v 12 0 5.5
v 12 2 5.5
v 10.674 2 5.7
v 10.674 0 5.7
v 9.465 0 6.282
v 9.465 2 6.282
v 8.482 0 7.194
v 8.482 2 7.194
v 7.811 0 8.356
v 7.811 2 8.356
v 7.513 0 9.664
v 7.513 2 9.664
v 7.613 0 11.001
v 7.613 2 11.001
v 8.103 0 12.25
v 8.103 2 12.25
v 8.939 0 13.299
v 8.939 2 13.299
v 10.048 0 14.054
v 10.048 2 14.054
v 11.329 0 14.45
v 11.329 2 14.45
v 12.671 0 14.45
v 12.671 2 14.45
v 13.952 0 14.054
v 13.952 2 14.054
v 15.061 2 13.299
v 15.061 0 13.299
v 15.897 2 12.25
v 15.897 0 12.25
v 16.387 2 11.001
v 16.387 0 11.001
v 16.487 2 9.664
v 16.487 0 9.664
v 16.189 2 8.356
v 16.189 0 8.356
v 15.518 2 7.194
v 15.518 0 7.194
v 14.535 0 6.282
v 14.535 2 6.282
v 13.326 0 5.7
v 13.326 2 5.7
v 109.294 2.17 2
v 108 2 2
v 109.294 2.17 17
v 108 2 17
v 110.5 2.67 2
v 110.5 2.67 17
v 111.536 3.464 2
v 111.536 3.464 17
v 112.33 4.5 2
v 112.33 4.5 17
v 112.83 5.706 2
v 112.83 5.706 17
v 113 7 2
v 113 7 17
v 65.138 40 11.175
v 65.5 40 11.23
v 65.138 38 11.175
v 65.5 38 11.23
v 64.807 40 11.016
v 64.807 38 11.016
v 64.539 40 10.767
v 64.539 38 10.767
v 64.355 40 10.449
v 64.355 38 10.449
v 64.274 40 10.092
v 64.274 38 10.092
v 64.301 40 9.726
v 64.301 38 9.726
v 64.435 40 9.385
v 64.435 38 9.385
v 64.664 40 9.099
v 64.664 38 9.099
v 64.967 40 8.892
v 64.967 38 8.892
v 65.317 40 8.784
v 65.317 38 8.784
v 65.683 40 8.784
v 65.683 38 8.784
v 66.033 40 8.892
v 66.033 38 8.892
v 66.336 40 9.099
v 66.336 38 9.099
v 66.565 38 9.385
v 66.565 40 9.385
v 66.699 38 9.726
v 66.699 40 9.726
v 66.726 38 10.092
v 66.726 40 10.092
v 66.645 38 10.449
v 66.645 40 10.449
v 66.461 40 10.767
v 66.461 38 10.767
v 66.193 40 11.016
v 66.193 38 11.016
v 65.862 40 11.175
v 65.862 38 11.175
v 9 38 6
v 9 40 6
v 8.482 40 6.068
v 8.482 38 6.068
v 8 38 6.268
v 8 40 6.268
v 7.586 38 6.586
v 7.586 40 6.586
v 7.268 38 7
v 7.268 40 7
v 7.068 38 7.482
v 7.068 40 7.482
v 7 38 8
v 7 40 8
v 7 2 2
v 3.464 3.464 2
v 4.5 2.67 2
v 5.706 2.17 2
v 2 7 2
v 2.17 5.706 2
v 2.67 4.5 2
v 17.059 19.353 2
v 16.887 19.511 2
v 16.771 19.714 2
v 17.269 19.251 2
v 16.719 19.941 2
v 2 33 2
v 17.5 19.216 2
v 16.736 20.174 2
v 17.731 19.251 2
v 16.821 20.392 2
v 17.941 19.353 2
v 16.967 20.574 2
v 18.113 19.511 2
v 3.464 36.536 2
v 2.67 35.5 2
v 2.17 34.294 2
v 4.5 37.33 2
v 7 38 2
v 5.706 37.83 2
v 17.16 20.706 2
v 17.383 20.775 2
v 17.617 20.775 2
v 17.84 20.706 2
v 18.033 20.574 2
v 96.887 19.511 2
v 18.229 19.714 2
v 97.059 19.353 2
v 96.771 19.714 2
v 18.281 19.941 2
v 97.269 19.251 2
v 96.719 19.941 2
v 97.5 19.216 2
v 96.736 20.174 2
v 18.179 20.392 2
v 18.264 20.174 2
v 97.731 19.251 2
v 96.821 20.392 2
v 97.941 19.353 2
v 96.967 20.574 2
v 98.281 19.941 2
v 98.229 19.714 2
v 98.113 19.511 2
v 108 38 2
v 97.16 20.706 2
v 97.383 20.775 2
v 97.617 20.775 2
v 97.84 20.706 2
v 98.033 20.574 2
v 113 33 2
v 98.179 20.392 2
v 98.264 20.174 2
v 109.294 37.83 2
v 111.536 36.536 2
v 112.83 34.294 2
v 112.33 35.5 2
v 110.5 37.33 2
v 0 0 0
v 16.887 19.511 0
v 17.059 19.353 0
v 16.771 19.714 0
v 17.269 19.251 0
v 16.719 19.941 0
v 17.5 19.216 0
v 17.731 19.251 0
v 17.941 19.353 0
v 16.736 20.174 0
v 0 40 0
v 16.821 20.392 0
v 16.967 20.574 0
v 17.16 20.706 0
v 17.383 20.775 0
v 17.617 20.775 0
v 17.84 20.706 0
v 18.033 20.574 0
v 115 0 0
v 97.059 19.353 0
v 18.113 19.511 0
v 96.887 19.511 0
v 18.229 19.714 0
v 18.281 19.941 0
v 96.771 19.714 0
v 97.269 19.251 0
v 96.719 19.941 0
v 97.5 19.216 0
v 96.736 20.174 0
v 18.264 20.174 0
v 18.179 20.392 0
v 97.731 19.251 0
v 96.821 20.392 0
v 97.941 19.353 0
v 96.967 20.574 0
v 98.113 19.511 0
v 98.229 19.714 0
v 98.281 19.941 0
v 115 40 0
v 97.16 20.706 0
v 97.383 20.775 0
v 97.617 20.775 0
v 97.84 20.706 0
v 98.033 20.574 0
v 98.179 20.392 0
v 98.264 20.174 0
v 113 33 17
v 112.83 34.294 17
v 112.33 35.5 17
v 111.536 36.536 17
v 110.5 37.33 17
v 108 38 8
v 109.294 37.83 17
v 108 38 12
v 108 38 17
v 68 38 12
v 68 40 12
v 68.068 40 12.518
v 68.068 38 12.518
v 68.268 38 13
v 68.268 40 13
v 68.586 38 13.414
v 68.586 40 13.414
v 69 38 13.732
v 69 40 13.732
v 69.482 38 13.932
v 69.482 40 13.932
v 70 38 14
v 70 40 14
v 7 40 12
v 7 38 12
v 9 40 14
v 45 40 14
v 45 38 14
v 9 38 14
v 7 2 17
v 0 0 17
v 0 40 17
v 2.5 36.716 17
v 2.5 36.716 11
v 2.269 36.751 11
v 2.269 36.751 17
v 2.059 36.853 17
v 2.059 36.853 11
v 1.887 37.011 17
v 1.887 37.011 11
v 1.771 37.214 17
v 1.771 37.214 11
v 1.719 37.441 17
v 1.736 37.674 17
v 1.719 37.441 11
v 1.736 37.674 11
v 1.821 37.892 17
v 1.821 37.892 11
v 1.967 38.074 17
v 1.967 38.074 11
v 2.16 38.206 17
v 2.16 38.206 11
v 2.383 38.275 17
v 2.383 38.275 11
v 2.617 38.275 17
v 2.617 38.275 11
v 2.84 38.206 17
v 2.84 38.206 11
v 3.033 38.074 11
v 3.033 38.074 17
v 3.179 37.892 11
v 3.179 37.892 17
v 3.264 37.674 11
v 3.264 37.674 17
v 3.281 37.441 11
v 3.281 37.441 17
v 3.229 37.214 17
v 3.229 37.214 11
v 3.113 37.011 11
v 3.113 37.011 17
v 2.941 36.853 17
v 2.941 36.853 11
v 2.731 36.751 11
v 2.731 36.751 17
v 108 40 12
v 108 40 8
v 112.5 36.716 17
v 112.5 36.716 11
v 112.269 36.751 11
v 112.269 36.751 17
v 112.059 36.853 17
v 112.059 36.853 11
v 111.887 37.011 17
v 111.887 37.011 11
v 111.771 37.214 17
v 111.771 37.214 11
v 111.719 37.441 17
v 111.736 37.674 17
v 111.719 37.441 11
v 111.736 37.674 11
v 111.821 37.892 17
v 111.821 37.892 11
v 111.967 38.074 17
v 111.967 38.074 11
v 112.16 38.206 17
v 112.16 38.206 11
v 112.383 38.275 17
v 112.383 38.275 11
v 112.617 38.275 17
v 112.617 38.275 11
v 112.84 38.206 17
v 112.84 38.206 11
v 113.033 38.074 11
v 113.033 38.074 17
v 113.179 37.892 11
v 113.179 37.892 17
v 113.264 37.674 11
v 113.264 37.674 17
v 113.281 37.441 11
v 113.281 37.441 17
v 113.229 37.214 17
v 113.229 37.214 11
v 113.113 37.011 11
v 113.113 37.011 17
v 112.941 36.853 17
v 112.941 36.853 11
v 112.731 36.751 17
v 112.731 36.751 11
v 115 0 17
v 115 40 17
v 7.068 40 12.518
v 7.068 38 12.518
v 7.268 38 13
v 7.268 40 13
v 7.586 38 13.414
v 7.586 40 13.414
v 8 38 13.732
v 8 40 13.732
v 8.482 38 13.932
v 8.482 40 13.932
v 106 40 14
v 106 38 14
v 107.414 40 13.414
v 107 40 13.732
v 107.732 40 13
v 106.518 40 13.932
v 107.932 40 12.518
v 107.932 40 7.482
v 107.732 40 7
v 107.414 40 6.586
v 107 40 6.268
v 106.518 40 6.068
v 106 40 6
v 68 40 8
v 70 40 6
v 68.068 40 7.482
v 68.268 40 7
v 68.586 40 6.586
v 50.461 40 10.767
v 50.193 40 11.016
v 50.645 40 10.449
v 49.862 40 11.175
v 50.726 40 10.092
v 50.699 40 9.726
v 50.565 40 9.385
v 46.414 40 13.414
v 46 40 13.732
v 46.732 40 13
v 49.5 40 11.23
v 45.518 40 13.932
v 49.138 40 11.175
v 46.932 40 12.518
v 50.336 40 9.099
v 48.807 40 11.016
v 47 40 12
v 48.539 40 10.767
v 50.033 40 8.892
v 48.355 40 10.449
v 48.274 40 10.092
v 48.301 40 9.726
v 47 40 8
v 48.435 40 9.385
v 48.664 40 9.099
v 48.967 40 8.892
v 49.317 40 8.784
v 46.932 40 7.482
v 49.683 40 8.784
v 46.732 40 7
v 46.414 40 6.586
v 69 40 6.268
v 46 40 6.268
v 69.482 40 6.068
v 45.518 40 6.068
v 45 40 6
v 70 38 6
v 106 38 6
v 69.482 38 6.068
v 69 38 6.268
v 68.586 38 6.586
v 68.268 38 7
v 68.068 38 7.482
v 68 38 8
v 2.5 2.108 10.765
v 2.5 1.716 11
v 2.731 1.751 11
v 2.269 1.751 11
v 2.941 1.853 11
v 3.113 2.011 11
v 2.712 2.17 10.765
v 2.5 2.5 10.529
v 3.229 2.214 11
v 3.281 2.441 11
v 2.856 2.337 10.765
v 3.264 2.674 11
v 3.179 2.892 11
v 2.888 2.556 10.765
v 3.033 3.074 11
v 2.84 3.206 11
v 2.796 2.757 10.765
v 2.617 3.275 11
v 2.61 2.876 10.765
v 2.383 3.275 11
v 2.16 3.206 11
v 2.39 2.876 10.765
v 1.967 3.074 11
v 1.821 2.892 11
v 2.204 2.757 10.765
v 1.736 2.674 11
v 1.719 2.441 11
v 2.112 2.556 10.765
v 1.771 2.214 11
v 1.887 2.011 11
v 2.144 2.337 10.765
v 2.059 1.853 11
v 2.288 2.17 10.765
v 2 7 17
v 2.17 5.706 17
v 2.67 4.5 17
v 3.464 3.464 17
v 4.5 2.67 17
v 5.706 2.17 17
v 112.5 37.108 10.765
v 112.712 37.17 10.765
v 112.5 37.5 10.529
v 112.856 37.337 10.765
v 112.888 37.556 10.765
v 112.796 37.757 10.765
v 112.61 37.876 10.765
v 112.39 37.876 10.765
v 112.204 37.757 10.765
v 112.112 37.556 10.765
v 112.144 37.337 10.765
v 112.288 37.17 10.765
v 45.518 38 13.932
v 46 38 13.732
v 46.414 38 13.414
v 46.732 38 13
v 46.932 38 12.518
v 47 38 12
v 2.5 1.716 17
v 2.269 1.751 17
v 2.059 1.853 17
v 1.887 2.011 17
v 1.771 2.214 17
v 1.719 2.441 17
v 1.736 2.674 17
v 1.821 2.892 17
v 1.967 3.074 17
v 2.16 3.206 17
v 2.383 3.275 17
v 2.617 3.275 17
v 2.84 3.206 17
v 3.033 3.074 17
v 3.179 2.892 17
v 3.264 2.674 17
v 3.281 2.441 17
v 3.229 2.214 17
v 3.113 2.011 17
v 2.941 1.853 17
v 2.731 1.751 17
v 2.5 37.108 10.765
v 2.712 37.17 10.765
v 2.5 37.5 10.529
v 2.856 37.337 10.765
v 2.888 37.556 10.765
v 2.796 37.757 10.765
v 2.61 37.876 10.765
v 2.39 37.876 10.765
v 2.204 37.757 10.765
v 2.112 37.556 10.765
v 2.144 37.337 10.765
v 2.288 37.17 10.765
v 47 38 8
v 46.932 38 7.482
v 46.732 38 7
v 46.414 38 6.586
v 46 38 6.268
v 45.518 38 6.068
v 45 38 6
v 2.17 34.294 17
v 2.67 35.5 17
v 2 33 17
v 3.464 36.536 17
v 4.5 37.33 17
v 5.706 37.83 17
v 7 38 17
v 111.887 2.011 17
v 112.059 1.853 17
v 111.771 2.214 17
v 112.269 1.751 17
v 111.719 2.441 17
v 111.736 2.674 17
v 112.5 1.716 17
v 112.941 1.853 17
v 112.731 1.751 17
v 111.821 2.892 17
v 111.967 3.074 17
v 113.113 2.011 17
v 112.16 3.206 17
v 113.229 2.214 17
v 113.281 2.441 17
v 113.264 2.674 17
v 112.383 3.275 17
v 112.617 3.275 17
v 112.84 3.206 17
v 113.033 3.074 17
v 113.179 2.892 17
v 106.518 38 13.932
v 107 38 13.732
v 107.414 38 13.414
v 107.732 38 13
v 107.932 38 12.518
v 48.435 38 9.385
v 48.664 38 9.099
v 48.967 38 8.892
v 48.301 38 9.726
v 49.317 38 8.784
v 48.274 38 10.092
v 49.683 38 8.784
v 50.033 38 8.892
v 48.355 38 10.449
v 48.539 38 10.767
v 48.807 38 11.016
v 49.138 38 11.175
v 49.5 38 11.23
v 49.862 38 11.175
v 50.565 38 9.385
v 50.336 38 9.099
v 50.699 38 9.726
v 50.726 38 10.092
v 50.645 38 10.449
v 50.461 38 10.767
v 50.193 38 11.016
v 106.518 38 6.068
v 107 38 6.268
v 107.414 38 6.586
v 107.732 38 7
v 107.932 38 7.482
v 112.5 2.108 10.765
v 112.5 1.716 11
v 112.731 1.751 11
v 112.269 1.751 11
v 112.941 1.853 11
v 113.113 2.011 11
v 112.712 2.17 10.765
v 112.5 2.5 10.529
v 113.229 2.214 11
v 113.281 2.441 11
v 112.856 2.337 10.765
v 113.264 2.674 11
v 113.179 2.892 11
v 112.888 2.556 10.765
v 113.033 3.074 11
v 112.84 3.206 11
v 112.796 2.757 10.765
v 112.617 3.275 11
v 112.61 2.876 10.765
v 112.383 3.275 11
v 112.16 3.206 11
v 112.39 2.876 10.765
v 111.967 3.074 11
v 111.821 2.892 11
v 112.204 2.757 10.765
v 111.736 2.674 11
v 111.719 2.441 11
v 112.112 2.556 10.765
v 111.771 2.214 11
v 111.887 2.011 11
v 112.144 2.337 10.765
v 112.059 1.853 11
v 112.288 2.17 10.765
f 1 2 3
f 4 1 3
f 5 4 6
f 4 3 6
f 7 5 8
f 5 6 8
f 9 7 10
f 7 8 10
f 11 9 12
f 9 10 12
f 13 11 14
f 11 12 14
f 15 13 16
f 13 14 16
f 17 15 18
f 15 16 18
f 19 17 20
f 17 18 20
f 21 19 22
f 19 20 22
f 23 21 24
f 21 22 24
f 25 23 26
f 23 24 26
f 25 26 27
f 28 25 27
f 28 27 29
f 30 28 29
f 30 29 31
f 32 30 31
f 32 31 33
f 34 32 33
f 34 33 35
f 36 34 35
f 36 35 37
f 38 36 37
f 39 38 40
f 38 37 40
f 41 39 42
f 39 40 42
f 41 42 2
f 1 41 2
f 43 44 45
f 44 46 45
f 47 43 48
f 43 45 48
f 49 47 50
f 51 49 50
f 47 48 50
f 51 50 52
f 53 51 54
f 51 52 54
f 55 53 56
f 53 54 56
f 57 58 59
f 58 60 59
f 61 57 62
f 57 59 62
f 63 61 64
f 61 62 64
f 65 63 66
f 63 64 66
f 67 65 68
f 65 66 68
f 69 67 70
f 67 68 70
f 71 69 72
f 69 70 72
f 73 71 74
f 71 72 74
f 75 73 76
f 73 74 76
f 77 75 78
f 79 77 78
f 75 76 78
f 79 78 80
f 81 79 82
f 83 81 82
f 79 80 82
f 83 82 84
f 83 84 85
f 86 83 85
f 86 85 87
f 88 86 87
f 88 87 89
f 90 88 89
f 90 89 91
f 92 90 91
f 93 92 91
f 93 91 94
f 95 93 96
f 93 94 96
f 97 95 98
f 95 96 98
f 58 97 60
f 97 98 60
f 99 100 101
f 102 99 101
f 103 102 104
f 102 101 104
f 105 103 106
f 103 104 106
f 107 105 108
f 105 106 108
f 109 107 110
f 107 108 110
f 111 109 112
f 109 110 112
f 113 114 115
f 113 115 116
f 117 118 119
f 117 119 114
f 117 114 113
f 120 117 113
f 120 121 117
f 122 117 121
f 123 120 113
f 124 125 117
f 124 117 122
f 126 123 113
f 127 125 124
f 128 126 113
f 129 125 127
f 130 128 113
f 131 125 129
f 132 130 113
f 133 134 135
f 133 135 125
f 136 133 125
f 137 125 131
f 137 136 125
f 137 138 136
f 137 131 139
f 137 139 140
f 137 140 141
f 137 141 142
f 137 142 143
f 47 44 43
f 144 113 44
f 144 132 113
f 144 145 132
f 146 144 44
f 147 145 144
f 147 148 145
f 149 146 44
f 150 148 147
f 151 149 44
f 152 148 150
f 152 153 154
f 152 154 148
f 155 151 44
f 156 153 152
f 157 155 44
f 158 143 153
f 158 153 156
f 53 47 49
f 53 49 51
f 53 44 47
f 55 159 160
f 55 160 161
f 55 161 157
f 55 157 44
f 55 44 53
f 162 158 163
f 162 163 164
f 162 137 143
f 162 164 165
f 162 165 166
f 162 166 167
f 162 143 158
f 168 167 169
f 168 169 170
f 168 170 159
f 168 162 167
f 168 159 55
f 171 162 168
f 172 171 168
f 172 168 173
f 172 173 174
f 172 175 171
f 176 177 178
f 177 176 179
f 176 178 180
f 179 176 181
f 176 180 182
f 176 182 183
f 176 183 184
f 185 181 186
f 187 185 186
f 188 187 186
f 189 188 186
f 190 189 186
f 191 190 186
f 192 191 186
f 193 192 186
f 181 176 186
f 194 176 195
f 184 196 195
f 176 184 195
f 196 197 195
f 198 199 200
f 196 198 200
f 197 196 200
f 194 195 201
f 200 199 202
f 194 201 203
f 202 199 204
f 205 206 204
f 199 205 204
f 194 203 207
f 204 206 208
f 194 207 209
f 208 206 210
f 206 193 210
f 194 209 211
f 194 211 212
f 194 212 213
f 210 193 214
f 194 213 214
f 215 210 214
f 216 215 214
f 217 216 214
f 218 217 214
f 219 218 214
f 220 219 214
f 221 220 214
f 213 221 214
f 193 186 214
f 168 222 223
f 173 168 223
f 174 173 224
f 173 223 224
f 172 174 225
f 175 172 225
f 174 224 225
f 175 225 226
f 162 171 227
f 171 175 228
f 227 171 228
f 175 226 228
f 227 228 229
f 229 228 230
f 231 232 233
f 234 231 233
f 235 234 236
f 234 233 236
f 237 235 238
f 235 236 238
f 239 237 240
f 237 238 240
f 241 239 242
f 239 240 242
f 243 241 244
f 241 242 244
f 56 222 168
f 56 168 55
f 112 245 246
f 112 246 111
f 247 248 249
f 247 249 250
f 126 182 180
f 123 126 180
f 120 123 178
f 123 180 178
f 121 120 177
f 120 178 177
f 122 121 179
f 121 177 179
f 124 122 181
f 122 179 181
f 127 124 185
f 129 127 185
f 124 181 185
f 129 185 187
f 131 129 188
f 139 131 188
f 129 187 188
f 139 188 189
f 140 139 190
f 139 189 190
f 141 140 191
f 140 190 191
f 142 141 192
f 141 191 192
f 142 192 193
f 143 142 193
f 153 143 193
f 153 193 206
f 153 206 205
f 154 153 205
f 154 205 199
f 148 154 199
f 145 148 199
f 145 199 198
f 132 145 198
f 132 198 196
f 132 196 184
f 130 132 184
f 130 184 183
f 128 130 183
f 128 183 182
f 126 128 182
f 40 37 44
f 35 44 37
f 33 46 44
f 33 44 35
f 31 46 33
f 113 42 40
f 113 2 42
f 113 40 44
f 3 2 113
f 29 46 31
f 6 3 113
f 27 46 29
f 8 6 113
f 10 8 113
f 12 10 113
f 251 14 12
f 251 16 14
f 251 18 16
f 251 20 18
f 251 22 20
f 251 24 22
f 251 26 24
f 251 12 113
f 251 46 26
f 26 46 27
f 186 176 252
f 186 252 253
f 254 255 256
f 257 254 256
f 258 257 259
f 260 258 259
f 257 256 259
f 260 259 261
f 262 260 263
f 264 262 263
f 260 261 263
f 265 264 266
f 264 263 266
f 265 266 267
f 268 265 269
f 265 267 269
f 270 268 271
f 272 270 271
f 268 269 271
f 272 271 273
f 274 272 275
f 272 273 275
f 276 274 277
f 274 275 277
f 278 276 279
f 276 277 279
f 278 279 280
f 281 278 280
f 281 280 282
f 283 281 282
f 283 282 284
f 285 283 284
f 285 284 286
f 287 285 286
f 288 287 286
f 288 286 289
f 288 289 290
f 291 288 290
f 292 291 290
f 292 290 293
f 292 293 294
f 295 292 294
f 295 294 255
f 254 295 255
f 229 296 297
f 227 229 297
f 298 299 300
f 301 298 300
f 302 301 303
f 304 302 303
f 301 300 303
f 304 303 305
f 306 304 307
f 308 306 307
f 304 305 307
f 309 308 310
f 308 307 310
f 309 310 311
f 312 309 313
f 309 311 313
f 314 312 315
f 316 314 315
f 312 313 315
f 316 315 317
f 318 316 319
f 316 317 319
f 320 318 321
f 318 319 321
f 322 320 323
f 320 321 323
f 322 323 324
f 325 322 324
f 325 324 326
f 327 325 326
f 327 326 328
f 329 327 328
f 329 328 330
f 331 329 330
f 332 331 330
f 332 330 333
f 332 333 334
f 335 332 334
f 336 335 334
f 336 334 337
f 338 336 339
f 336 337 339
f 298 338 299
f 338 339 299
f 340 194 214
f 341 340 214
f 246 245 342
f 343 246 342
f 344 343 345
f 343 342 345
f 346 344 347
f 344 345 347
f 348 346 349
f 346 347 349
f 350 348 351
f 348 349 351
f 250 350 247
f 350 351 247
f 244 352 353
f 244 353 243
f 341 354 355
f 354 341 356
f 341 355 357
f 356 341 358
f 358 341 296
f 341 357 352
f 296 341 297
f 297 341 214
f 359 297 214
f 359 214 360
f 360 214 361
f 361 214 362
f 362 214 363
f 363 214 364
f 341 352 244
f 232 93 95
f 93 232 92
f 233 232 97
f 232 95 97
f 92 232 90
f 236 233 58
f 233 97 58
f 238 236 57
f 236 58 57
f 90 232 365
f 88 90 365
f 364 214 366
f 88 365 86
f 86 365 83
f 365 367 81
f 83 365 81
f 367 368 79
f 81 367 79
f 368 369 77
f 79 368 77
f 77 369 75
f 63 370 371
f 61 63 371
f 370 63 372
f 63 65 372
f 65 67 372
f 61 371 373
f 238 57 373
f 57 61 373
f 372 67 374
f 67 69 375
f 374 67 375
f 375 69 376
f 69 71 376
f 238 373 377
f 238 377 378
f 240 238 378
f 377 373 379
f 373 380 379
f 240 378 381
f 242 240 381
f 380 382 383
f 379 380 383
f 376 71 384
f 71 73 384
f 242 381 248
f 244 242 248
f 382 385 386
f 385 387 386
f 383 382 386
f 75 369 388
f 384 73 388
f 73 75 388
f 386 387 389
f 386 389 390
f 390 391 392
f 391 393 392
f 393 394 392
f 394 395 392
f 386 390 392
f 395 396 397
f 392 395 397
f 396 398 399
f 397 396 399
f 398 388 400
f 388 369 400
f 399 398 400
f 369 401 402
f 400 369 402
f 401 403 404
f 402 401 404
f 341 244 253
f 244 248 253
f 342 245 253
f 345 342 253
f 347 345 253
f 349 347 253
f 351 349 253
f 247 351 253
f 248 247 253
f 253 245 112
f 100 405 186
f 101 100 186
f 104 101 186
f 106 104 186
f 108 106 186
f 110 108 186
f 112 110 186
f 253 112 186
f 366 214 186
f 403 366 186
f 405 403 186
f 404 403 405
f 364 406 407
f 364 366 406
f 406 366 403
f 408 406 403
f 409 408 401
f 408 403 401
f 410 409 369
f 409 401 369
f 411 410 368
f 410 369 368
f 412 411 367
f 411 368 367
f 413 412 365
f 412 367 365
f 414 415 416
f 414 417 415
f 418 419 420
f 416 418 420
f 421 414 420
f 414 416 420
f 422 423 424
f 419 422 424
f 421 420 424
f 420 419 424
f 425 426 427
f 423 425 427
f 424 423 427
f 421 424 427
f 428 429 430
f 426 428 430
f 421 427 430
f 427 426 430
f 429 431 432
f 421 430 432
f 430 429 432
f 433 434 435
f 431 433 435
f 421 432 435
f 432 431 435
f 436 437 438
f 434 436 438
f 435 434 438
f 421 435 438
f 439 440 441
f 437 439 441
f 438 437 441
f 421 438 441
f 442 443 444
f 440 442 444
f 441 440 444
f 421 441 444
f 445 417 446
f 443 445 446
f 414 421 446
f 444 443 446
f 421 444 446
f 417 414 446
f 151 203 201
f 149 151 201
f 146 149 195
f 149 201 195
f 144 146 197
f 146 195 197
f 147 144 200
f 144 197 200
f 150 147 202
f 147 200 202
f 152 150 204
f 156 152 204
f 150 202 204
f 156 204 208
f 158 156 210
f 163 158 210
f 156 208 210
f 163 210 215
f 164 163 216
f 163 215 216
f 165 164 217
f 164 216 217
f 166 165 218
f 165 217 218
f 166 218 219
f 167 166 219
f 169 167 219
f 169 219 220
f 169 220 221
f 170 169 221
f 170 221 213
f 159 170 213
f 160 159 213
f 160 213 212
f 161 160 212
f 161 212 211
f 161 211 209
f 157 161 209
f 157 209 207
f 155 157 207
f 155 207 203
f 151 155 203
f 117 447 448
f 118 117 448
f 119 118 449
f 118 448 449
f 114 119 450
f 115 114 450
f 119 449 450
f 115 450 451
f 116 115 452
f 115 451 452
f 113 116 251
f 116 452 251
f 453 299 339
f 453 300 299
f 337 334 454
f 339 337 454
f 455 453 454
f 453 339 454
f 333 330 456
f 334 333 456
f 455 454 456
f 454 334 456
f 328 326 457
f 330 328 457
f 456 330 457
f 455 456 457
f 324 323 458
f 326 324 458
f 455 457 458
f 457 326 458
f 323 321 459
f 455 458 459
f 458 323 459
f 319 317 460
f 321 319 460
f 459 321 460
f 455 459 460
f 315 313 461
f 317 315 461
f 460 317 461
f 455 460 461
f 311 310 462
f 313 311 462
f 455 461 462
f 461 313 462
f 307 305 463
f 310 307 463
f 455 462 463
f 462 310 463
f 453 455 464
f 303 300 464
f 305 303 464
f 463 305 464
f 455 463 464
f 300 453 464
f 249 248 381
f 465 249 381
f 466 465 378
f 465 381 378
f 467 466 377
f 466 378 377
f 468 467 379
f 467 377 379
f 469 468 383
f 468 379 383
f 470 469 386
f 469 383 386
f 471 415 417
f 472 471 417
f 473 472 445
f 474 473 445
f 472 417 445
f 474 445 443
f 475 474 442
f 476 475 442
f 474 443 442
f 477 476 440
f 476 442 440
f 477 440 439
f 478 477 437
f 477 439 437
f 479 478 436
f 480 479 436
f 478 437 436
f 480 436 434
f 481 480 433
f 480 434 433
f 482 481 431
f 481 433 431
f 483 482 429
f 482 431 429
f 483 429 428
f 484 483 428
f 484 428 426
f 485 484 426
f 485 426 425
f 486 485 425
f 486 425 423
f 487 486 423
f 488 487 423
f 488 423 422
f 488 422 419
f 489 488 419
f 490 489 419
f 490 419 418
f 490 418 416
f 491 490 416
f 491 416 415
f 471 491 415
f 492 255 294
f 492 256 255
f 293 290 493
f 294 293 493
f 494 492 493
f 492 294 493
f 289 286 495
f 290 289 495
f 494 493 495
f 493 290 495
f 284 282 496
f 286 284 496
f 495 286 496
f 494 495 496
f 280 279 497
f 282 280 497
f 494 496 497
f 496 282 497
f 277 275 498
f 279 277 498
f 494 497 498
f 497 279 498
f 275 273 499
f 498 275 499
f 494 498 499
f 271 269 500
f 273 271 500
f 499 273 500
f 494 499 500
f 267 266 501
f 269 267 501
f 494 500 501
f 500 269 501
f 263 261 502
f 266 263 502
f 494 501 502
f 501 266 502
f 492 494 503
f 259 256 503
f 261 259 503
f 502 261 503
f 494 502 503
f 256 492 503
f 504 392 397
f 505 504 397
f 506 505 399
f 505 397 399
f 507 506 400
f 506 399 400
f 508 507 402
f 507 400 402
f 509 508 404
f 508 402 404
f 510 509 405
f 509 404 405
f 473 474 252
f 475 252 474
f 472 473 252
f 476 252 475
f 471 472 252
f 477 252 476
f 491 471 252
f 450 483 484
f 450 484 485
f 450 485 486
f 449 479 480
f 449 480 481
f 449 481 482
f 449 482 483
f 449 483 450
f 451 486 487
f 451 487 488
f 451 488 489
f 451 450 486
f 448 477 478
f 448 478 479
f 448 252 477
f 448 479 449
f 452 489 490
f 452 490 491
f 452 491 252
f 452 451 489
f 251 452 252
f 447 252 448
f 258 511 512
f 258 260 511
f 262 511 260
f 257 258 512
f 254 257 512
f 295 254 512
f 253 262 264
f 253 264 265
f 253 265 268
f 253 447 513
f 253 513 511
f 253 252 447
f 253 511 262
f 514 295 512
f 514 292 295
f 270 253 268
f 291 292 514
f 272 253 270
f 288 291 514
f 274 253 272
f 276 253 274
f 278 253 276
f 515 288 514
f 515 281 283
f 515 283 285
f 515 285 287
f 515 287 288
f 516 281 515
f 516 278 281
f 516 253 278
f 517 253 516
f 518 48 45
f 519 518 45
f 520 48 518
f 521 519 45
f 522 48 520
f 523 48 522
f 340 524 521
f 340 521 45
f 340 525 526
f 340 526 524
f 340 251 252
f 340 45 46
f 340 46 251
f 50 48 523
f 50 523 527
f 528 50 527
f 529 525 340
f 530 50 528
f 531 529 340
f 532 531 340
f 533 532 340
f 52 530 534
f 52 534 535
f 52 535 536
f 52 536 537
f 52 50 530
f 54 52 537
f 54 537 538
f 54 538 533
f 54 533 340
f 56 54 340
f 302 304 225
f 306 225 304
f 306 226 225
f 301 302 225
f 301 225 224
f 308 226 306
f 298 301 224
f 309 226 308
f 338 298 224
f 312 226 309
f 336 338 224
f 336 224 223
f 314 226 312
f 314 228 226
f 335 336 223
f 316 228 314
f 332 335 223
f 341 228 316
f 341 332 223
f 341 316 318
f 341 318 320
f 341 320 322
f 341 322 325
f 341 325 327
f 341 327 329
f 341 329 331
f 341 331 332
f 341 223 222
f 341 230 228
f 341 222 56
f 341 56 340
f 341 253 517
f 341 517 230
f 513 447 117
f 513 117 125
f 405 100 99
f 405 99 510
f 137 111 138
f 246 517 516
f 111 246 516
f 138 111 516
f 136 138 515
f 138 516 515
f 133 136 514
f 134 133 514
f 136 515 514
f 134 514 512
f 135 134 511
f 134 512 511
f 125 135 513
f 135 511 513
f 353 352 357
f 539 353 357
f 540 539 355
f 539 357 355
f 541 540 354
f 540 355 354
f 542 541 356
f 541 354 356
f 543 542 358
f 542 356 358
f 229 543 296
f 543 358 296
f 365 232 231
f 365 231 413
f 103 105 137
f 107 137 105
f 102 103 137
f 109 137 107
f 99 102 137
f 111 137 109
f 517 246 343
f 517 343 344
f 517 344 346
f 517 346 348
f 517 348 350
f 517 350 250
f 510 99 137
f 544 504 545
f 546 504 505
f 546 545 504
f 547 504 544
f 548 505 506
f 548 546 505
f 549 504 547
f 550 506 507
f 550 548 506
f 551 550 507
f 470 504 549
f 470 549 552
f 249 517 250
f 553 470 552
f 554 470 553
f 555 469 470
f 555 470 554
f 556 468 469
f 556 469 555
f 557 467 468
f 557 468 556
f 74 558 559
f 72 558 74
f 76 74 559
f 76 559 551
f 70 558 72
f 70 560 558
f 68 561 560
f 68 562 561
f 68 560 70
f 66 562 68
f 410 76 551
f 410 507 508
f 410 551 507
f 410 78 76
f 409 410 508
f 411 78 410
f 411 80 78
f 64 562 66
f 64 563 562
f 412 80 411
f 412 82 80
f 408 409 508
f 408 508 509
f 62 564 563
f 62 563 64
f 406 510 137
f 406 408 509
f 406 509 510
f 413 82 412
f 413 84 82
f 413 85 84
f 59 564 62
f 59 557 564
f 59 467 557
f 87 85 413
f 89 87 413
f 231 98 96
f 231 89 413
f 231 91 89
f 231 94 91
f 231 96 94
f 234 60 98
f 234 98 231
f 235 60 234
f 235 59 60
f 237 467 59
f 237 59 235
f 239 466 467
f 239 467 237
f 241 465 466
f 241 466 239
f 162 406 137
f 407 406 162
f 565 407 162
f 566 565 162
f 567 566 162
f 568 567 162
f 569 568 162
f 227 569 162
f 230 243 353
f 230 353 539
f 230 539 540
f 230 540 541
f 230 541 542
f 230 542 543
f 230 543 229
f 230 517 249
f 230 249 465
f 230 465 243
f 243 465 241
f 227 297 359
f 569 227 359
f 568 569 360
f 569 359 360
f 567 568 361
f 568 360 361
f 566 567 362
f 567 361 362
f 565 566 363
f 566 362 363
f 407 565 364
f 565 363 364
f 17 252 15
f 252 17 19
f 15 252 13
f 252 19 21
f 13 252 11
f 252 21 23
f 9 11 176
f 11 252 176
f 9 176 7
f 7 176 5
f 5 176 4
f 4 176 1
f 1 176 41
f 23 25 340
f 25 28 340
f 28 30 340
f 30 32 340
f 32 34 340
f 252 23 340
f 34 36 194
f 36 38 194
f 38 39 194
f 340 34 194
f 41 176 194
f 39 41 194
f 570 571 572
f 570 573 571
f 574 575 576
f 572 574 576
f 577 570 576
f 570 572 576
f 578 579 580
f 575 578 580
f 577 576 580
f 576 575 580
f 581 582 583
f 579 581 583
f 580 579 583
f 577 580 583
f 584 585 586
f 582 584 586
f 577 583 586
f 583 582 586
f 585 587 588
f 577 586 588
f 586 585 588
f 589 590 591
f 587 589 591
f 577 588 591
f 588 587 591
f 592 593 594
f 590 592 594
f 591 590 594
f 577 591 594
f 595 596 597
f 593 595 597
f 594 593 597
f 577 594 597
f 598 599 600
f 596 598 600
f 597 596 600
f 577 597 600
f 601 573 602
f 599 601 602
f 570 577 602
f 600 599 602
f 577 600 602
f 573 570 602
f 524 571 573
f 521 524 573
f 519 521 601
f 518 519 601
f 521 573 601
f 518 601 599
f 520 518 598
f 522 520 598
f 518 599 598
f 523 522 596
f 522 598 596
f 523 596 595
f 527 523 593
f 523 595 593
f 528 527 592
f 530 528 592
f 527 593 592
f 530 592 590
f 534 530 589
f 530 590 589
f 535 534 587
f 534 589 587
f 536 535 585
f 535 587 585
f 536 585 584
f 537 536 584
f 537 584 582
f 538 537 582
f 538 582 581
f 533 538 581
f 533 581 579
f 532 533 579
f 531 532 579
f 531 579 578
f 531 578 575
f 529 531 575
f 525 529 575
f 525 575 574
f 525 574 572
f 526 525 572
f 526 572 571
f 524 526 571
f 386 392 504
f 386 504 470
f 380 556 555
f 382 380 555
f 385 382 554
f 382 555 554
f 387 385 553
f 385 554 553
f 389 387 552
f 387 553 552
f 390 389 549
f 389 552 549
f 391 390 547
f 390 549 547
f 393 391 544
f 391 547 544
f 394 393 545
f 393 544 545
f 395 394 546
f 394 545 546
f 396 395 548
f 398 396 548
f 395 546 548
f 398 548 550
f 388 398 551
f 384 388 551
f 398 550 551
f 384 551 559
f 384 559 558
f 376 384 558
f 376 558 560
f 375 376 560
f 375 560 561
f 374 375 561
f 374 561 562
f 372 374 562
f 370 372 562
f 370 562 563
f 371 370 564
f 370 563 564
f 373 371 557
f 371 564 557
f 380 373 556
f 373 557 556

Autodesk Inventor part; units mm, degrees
ref_plane "YZ Plane" through (0, 0, 0) normal (1, 0, 0) x (0, 1, 0)
ref_plane "XZ Plane" through (0, 0, 0) normal (0, 1, 0) x (-1, 0, 0)
ref_plane "XY Plane" through (0, 0, 0) normal (0, 0, 1) x (1, 0, 0)
sketch "Skizze1" plane through (0, 0, 0) normal (0, 0, 1) x (1, 0, 0)
  line L0 (-23, 0) -> (138, 0) projected
  line L1 (0, -8) -> (0, 48) projected
  line L2 (0, 0) -> (115, 0)
  line L3 (115, 0) -> (115, 40)
  line L4 (115, 40) -> (0, 40)
  line L5 (0, 40) -> (0, 0)
  dimension "d0" = 40
  dimension "d1" = 115
extrude "Extrusion1" add sketch "Skizze1" along normal blind 17
sketch "Skizze2" plane through (0, 0, 17) normal (0, 0, 1) x (1, 0, 0)
  line L0 (0, 0) -> (115, 0) projected
  line L1 (115, 0) -> (115, 40) projected
  line L2 (115, 40) -> (0, 40) projected
  line L3 (0, 40) -> (0, 0) projected
  line L4 (7, 38) -> (108, 38)
  line L5 (113, 33) -> (113, 7)
  line L6 (108, 2) -> (7, 2)
  line L7 (2, 7) -> (2, 33)
  arc A0 (7, 38) -> (2, 33) centre (7, 33) ccw
  arc A1 (113, 33) -> (108, 38) centre (108, 33) ccw
  arc A2 (108, 2) -> (113, 7) centre (108, 7) ccw
  arc A3 (2, 7) -> (7, 2) centre (7, 7) ccw
  dimension "d4" = 2
  dimension "d5" = 5
extrude "Extrusion2" cut sketch "Skizze2" against normal blind 15 contours L4 A1 L5 A2 L6 A3 L7 A0
sketch "Skizze3" plane through (0, 0, 17) normal (0, 0, 1) x (1, 0, 0)
  line L0 (0, 0) -> (115, 0) projected
  line L1 (115, 0) -> (115, 40) projected
  line L2 (115, 40) -> (0, 40) projected
  line L3 (0, 40) -> (0, 0) projected
  line L4 (2.5, 37.5) -> (112.5, 37.5)
  line L5 (112.5, 37.5) -> (112.5, 2.5)
  line L6 (112.5, 2.5) -> (2.5, 2.5)
  line L7 (2.5, 2.5) -> (2.5, 37.5)
  dimension "d8" = 2.5
hole "Bohrung1" at (112.5, 37.5, 17) at (112.5, 2.5, 17) at (2.5, 2.5, 17) at (2.5, 37.5, 17) direction (0, 0, -1) diameter 1.567 depth 6 tip angle 118 thread size "M2x0.4" class "6H" standard "ISO Metric profile"
sketch "Skizze4" plane through (0, 40, 0) normal (0, 1, 0) x (1, 0, 0)
  line L0 (0, 0) -> (0, -17) projected
  line L1 (113, -17) -> (108, -17) projected
  line L2 (113, -17) -> (108, -17) projected
  line L3 (113, -17) -> (113, -2) projected
  line L4 (113, -2) -> (108, -2) projected
  line L5 (108, -17) -> (108, -2) projected
  line L6 (108, -17) -> (7, -17) projected
  line L7 (108, -17) -> (108, -2) projected
  line L8 (108, -2) -> (7, -2) projected
  line L9 (7, -17) -> (7, -2) projected
  line L10 (88, -11) -> (88, -16) projected
  line L11 (108, -11) -> (88, -11) projected
  line L12 (108, -16) -> (108, -11) projected
  line L13 (88, -16) -> (108, -16) projected
  line L14 (-60.4, 0) -> (362.4, 0) projected
  line L15 (0, 3.4) -> (0, -20.4) projected
  arc A0 (118, -8) -> (118, -12) centre (118, -10) ccw projected
  line L16 (302, -14) -> (294, -14) projected
  line L17 (302, -6) -> (302, -14) projected
  line L18 (294, -6) -> (302, -6) projected
  line L19 (106, -14) -> (70, -14)
  line L20 (68, -12) -> (68, -8)
  line L21 (70, -6) -> (106, -6)
  line L22 (108, -8) -> (108, -12)
  arc A1 (108, -8) -> (106, -6) centre (106, -8) ccw
  arc A2 (106, -14) -> (108, -12) centre (106, -12) ccw
  arc A3 (68, -12) -> (70, -14) centre (70, -12) ccw
  arc A4 (70, -6) -> (68, -8) centre (70, -8) ccw
  line L23 (45, -14) -> (9, -14)
  line L24 (7, -12) -> (7, -8)
  line L25 (9, -6) -> (45, -6)
  line L26 (47, -8) -> (47, -12)
  arc A5 (45, -14) -> (47, -12) centre (45, -12) ccw
  arc A6 (47, -8) -> (45, -6) centre (45, -8) ccw
  arc A7 (9, -6) -> (7, -8) centre (9, -8) ccw
  arc A8 (7, -12) -> (9, -14) centre (9, -12) ccw
  line L27 (115, 0) -> (115, -17) projected
  arc A9 (283, -8) -> (281, -6) centre (281, -8) ccw projected
  line L28 (283, -8) -> (283, -12) projected
  arc A10 (281, -14) -> (283, -12) centre (281, -12) ccw projected
  line L29 (294, -14) -> (281, -14) projected
  line L30 (281, -6) -> (294, -6) projected
  point P0 (6, -6)
  point P1 (6, -14)
  point P2 (108, -14)
  point P3 (68, -6)
  point P4 (68, -14)
  point P5 (47, -14)
  point P6 (7, -6)
  dimension "d16" = 40
  dimension "d17" = 2
  dimension "d18" = 7
  dimension "d19" = 40
  dimension "d20" = 2
  dimension "d23" = 7
extrude "Extrusion3" cut sketch "Skizze4" against normal blind 2 contours A2 L19 L10 L11 L5 | L9 A7 L25 A6 L26 A5 L23 A8 | L5 L11 L10 L19 A3 L20 A4 L21 A1
sketch "Skizze5" plane through (0, 40, 0) normal (0, 1, 0) x (1, 0, 0)
  line L0 (0, 0) -> (0, -17) projected
  line L1 (115, -17) -> (0, -17) projected
  line L2 (115, 0) -> (115, -17) projected
  line L3 (0, -10) -> (115, -10)
  line L4 (115, 0) -> (0, 0) projected
  line L5 (57.5, -10) -> (57.5, -13.4142)
  point P0 (49.5, -10)
  point P1 (65.5, -10)
  dimension "d24" = 7
  dimension "d35" = 16
hole "Bohrung2" at (49.5, 40, 10) at (65.5, 40, 10) direction (0, -1, 0) diameter 2.459 depth 8 tip angle 118 thread size "M3x0.5" class "6H" standard "ISO Metric profile"
sketch "Skizze6" plane through (0, 0, 2) normal (0, 0, 1) x (1, 0, 0)
  line L0 (7, 38) -> (108, 38) projected
  line L1 (2, 7) -> (2, 33) projected
  line L2 (113, 33) -> (113, 7) projected
  line L3 (-23, 0) -> (138, 0) projected
  line L4 (0, -8) -> (0, 48) projected
  line L5 (2, 20) -> (113, 20)
  line L6 (57.5, 38) -> (57.5, 39.5212)
  point P0 (0, 0)
  point P1 (17.5, 20)
  point P2 (97.5, 20)
  dimension "d36" = 80
hole "Bohrung3" at (17.5, 20, 2) at (97.5, 20, 2) direction (0, 0, -1) diameter 1.567 end through all thread size "M2x0.4" class "6H" standard "ISO Metric profile"
sketch "Skizze7" plane through (0, 0, 0) normal (0, -1, 0) x (1, 0, 0)
  line L0 (0, 0) -> (115, 0) projected
  line L1 (0, 0) -> (0, 17) projected
  line L2 (0, 10) -> (20.9799, 10)
  line L3 (7, 17) -> (7, 2) projected
  point P0 (12, 10)
  dimension "d44" = 10
  dimension "d45" = 12
hole "Bohrung4" at (12, 0, 10) direction (0, 1, 0) diameter 9 end up to surface
properties part number "13_1087_023"
